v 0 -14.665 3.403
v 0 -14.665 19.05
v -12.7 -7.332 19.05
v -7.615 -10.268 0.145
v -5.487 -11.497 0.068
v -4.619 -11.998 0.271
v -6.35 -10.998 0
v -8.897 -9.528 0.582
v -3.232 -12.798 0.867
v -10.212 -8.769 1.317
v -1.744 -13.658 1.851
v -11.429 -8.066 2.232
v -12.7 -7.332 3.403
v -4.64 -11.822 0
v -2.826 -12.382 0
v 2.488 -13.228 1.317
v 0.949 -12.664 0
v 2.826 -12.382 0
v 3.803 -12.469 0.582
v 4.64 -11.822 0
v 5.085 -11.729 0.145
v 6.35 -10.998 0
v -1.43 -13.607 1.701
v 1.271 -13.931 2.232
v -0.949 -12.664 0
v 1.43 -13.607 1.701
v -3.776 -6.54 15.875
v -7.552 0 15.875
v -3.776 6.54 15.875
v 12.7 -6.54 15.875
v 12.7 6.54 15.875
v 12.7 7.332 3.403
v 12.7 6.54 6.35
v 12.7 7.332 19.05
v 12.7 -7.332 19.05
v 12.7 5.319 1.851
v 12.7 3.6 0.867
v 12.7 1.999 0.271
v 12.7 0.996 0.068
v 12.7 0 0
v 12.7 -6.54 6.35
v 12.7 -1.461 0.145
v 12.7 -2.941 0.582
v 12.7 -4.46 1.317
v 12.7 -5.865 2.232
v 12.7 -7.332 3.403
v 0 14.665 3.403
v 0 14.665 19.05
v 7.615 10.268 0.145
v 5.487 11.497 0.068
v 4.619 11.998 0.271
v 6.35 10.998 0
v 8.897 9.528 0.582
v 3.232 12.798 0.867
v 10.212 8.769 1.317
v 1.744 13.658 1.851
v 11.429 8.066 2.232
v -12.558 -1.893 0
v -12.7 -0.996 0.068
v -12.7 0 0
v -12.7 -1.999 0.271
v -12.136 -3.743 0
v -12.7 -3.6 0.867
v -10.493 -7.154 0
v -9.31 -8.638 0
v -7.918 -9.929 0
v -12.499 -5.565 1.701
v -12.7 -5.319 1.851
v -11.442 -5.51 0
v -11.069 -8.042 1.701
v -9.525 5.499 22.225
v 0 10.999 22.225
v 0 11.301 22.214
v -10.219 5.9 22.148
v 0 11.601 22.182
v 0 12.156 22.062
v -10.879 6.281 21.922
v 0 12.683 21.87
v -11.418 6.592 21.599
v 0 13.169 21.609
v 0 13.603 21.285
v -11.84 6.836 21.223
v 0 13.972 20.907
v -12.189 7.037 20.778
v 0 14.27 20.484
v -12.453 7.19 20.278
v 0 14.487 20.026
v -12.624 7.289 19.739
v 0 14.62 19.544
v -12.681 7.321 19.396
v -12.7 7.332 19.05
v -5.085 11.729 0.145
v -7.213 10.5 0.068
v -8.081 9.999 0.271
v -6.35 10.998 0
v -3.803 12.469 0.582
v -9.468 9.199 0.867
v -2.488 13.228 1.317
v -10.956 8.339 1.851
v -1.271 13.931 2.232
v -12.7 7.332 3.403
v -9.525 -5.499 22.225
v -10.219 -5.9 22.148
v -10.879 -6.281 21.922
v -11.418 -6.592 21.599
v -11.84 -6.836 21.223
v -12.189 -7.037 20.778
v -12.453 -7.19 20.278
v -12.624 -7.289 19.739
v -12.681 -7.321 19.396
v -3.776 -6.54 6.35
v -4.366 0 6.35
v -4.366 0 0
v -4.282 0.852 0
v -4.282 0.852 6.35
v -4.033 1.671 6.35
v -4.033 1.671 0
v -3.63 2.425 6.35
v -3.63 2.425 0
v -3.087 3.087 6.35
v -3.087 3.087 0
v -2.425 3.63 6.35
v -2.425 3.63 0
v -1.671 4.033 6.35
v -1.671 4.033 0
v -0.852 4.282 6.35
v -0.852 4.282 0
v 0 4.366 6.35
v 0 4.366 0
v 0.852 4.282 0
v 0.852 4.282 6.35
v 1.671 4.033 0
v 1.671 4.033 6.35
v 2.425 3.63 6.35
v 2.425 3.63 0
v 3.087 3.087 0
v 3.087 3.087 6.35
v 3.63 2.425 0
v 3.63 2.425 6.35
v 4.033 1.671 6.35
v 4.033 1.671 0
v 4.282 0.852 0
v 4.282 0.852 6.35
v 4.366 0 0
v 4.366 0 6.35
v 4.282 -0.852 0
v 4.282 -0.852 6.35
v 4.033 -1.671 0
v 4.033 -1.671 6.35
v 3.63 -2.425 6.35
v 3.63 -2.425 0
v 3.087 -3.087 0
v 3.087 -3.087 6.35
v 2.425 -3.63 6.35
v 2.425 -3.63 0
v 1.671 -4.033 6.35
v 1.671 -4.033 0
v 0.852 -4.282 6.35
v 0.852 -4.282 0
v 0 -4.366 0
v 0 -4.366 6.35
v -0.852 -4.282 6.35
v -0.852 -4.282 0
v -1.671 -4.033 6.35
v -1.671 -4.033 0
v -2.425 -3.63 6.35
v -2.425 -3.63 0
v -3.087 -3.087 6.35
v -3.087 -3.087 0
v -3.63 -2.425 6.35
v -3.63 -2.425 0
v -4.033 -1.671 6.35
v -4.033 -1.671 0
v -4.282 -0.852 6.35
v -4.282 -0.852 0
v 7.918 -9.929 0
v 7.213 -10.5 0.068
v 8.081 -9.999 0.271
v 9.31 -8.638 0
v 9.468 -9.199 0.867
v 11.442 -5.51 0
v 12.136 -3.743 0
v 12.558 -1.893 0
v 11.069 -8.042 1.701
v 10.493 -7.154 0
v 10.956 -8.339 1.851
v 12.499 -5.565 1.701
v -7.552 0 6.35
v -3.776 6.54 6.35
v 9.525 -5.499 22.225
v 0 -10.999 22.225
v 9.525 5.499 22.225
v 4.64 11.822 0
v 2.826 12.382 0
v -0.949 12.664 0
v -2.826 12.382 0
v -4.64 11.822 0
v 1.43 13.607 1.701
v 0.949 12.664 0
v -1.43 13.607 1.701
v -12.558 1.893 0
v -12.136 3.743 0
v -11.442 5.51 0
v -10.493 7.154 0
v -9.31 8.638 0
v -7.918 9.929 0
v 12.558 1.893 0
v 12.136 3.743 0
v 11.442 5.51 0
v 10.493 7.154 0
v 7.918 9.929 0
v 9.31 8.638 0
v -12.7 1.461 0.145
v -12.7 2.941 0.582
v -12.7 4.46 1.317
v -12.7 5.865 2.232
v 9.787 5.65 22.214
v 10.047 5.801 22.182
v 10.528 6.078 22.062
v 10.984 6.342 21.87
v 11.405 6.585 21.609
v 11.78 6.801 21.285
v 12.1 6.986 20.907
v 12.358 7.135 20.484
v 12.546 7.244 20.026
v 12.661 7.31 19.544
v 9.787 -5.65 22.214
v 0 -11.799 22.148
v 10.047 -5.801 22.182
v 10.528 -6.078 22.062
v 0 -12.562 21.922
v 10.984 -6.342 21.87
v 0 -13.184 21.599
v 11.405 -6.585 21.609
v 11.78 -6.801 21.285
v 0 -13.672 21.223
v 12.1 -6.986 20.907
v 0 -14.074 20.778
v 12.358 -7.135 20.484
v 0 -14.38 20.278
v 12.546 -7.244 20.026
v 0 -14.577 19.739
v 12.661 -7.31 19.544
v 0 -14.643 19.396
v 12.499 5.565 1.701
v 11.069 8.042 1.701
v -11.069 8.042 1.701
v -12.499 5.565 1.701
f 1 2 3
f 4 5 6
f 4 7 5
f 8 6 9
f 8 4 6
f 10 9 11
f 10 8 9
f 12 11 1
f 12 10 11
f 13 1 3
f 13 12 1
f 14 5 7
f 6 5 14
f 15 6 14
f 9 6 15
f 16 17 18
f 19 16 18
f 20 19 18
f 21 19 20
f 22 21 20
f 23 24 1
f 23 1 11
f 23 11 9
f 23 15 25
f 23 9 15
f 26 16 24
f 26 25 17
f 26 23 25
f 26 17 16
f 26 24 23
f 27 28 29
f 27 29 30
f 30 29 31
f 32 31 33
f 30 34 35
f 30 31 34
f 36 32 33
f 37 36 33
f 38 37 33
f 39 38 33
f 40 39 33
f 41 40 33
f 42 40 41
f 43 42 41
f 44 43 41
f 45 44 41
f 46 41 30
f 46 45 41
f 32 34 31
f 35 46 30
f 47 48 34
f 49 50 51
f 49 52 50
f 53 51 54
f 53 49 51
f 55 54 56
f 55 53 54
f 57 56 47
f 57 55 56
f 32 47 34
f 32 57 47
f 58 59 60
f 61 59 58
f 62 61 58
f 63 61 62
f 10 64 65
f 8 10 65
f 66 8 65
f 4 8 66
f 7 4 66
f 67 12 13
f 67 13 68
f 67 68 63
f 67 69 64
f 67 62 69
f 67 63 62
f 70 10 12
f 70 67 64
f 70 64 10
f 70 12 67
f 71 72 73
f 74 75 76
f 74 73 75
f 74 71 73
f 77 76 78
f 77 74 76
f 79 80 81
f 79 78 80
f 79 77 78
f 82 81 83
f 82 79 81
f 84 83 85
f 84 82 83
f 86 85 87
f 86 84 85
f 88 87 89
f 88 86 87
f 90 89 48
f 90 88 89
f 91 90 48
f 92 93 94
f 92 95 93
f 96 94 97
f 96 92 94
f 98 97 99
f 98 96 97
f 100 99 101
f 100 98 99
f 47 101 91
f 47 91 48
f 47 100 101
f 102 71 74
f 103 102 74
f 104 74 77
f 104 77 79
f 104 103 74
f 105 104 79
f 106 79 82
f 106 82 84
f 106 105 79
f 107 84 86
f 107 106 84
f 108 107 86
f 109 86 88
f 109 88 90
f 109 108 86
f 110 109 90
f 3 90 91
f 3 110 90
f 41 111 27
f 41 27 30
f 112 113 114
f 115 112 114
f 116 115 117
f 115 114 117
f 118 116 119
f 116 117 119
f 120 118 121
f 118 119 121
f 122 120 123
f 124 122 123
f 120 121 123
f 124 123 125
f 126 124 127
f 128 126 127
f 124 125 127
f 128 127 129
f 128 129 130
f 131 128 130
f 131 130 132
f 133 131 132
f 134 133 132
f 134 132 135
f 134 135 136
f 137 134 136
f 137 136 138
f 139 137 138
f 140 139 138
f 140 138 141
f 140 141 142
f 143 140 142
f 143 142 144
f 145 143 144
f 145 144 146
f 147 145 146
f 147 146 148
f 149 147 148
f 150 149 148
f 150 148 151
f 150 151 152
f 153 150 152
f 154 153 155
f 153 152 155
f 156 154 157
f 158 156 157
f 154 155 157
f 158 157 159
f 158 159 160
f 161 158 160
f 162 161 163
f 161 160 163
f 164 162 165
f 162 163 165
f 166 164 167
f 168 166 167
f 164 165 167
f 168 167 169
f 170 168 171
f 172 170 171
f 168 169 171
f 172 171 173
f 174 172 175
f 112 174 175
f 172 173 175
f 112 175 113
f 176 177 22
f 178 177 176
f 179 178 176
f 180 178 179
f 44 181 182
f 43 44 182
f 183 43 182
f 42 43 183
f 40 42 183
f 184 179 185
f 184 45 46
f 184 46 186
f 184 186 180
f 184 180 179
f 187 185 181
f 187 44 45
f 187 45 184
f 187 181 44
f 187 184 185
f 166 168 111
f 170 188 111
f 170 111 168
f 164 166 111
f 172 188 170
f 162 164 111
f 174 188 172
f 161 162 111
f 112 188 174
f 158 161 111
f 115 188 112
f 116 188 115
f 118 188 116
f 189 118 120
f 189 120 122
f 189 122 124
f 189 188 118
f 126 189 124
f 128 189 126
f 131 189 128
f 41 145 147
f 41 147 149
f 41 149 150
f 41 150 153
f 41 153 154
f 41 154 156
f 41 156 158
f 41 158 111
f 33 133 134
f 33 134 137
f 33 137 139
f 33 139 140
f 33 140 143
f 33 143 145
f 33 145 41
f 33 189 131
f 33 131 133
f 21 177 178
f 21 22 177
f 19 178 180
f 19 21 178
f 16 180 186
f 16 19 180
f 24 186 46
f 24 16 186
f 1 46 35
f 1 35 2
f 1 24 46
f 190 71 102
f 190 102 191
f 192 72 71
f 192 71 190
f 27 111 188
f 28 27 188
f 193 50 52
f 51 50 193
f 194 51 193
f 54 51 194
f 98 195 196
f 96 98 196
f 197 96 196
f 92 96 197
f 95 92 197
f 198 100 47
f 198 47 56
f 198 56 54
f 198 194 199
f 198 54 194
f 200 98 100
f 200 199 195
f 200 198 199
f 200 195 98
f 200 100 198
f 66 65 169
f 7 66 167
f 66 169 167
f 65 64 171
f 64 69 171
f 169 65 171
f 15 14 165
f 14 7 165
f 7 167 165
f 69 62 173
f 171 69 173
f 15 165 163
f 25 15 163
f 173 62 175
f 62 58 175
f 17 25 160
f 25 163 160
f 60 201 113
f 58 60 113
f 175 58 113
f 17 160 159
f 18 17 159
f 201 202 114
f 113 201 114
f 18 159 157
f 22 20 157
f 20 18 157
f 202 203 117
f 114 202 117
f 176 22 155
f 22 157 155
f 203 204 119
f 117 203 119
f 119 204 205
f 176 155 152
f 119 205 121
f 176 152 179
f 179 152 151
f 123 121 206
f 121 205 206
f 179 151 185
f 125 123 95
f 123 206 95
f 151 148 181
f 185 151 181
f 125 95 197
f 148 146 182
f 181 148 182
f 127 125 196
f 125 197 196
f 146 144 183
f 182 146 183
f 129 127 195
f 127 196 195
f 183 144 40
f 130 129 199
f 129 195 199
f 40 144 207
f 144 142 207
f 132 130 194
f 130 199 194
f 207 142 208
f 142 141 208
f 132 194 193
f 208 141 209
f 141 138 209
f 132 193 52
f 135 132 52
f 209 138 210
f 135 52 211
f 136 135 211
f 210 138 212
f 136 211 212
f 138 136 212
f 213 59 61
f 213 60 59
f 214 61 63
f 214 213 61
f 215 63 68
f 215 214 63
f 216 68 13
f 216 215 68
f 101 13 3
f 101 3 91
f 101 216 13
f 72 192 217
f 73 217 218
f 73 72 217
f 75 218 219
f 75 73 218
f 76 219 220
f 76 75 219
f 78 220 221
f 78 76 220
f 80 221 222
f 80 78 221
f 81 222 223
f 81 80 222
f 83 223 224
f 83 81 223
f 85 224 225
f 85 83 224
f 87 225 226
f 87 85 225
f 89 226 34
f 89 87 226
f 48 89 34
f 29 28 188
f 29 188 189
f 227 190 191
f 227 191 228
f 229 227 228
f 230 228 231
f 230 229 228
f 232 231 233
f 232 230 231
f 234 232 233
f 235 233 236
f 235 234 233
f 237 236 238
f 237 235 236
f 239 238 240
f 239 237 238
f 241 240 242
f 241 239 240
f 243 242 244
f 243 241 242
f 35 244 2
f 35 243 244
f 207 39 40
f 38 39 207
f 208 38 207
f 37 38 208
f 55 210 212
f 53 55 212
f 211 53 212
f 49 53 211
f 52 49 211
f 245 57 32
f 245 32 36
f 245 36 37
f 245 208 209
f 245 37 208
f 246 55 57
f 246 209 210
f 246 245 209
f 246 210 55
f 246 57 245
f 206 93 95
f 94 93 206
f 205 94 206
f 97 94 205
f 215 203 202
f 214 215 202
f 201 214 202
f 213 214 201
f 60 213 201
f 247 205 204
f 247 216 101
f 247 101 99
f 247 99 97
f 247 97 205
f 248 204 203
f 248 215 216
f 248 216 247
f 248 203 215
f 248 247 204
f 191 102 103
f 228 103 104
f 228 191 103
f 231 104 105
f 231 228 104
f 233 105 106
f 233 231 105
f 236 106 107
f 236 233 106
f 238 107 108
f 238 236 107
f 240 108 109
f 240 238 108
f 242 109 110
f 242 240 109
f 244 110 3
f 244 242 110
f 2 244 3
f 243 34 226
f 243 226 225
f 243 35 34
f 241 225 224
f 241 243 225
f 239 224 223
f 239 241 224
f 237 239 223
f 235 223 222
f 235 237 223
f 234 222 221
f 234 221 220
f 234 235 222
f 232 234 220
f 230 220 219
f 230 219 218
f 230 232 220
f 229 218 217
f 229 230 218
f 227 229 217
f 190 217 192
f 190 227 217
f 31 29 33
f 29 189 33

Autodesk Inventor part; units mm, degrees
ref_plane "YZ Plane" through (0, 0, 0) normal (1, 0, 0) x (0, 1, 0)
ref_plane "XZ Plane" through (0, 0, 0) normal (0, 1, 0) x (-1, 0, 0)
ref_plane "XY Plane" through (0, 0, 0) normal (0, 0, 1) x (1, 0, 0)
sketch "Sketch1" plane through (0, 0, 0) normal (0, 0, 1) x (1, 0, 0)
  line L0 (0, 14.6647) -> (12.7, 7.3323)
  line L1 (12.7, 7.3323) -> (12.7, -7.3323)
  line L2 (12.7, -7.3323) -> (0, -14.6647)
  line L3 (0, -14.6647) -> (-12.7, -7.3323)
  line L4 (-12.7, -7.3323) -> (-12.7, 7.3323)
  line L5 (-12.7, 7.3323) -> (0, 14.6647)
  point P0 (0, 0)
  point P1 (0, 0)
  dimension "d0" = 25.4
extrude "Extrusion1" add sketch "Sketch1" along normal blind 6.35
sketch "Sketch2" plane through (0, 0, 6.35) normal (0, 0, 1) x (1, 0, 0)
  line L0 (12.7, 7.3323) -> (0, 14.6647) projected
  line L1 (0, 14.6647) -> (-12.7, 7.3323) projected
  line L2 (-12.7, 7.3323) -> (-12.7, -7.3323) projected
  line L3 (-12.7, -7.3323) -> (0, -14.6647) projected
  line L4 (0, -14.6647) -> (12.7, -7.3323) projected
  line L5 (12.7, -7.3323) -> (12.7, 7.3323) projected
  line L6 (7.5523, 0) -> (3.7762, -6.5405)
  line L7 (3.7762, -6.5405) -> (-3.7762, -6.5405)
  line L8 (-3.7762, -6.5405) -> (-7.5523, 0)
  line L9 (-7.5523, 0) -> (-3.7762, 6.5405)
  line L10 (-3.7762, 6.5405) -> (3.7762, 6.5405)
  line L11 (3.7762, 6.5405) -> (7.5523, 0)
  line L12 (3.7762, 6.5405) -> (12.7, 6.5405)
  line L13 (3.7762, -6.5405) -> (12.7, -6.5405)
  point P0 (0, 0)
  point P1 (0, 0)
  dimension "d3" = 13.081
extrude "Extrusion2" add sketch "Sketch2" along normal blind 9.525 contours L5 L12 L10 L9 L8 L7 L13 L4 L3 L2 L1 L0
sketch "Sketch3" plane through (0, 0, 15.875) normal (0, 0, 1) x (1, 0, 0)
  line L0 (12.7, 7.3323) -> (0, 14.6647) projected
  line L1 (0, 14.6647) -> (-12.7, 7.3323) projected
  line L2 (-12.7, 7.3323) -> (-12.7, -7.3323) projected
  line L3 (-12.7, -7.3323) -> (0, -14.6647) projected
  line L4 (0, -14.6647) -> (12.7, -7.3323) projected
  line L5 (12.7, -7.3323) -> (12.7, -6.5405) projected
  line L6 (12.7, -6.5405) -> (-3.7762, -6.5405) projected
  line L7 (-3.7762, -6.5405) -> (-7.5523, 0) projected
  line L8 (-7.5523, 0) -> (-3.7762, 6.5405) projected
  line L9 (-3.7762, 6.5405) -> (12.7, 6.5405) projected
  line L10 (12.7, 6.5405) -> (12.7, 7.3323) projected
  line L11 (12.7, 6.5405) -> (12.7, -6.5405)
  point P0 (0, 0)
extrude "Extrusion3" add sketch "Sketch3" along normal blind 6.35
sketch "Sketch4" plane through (0, 0, 0) normal (0, 0, -1) x (-1, 0, 0)
  circle A0 centre (0, 0) radius 12.7
  line L0 (0, 14.6647) -> (-12.7, 7.3323) projected
extrude "Extrusion4" cut sketch "Sketch4" against normal through all draft 30 keep common part
sketch "Sketch5" plane through (0, 0, 0) normal (0, 0, -1) x (-1, 0, 0)
  circle A0 centre (0, 0) radius 12.7
  circle A1 centre (0, 0) radius 4.3656
  arc A2 (-12.7, 0) -> (-6.35, -10.9985) centre (0, 0) ccw projected
  arc A3 (-6.35, -10.9985) -> (6.35, -10.9985) centre (0, 0) ccw projected
  arc A4 (6.35, -10.9985) -> (12.7, 0) centre (0, 0) ccw projected
  arc A5 (12.7, 0) -> (6.35, 10.9985) centre (0, 0) ccw projected
  arc A6 (6.35, 10.9985) -> (-6.35, 10.9985) centre (0, 0) ccw projected
  arc A7 (-6.35, 10.9985) -> (-12.7, 0) centre (0, 0) ccw projected
  dimension "d13" = 8.7312
extrude "Extrusion5" cut sketch "Sketch5" against normal up to next contours A1
fillet "Fillet1" radius 3.175 6 edges at (12.7, 0, 22.225) (6.35, 10.9985, 22.225) (-6.35, 10.9985, 22.225) (-12.7, 0, 22.225) (-6.35, -10.9985, 22.225) (6.35, -10.9985, 22.225)
properties part number "bottom nut"
